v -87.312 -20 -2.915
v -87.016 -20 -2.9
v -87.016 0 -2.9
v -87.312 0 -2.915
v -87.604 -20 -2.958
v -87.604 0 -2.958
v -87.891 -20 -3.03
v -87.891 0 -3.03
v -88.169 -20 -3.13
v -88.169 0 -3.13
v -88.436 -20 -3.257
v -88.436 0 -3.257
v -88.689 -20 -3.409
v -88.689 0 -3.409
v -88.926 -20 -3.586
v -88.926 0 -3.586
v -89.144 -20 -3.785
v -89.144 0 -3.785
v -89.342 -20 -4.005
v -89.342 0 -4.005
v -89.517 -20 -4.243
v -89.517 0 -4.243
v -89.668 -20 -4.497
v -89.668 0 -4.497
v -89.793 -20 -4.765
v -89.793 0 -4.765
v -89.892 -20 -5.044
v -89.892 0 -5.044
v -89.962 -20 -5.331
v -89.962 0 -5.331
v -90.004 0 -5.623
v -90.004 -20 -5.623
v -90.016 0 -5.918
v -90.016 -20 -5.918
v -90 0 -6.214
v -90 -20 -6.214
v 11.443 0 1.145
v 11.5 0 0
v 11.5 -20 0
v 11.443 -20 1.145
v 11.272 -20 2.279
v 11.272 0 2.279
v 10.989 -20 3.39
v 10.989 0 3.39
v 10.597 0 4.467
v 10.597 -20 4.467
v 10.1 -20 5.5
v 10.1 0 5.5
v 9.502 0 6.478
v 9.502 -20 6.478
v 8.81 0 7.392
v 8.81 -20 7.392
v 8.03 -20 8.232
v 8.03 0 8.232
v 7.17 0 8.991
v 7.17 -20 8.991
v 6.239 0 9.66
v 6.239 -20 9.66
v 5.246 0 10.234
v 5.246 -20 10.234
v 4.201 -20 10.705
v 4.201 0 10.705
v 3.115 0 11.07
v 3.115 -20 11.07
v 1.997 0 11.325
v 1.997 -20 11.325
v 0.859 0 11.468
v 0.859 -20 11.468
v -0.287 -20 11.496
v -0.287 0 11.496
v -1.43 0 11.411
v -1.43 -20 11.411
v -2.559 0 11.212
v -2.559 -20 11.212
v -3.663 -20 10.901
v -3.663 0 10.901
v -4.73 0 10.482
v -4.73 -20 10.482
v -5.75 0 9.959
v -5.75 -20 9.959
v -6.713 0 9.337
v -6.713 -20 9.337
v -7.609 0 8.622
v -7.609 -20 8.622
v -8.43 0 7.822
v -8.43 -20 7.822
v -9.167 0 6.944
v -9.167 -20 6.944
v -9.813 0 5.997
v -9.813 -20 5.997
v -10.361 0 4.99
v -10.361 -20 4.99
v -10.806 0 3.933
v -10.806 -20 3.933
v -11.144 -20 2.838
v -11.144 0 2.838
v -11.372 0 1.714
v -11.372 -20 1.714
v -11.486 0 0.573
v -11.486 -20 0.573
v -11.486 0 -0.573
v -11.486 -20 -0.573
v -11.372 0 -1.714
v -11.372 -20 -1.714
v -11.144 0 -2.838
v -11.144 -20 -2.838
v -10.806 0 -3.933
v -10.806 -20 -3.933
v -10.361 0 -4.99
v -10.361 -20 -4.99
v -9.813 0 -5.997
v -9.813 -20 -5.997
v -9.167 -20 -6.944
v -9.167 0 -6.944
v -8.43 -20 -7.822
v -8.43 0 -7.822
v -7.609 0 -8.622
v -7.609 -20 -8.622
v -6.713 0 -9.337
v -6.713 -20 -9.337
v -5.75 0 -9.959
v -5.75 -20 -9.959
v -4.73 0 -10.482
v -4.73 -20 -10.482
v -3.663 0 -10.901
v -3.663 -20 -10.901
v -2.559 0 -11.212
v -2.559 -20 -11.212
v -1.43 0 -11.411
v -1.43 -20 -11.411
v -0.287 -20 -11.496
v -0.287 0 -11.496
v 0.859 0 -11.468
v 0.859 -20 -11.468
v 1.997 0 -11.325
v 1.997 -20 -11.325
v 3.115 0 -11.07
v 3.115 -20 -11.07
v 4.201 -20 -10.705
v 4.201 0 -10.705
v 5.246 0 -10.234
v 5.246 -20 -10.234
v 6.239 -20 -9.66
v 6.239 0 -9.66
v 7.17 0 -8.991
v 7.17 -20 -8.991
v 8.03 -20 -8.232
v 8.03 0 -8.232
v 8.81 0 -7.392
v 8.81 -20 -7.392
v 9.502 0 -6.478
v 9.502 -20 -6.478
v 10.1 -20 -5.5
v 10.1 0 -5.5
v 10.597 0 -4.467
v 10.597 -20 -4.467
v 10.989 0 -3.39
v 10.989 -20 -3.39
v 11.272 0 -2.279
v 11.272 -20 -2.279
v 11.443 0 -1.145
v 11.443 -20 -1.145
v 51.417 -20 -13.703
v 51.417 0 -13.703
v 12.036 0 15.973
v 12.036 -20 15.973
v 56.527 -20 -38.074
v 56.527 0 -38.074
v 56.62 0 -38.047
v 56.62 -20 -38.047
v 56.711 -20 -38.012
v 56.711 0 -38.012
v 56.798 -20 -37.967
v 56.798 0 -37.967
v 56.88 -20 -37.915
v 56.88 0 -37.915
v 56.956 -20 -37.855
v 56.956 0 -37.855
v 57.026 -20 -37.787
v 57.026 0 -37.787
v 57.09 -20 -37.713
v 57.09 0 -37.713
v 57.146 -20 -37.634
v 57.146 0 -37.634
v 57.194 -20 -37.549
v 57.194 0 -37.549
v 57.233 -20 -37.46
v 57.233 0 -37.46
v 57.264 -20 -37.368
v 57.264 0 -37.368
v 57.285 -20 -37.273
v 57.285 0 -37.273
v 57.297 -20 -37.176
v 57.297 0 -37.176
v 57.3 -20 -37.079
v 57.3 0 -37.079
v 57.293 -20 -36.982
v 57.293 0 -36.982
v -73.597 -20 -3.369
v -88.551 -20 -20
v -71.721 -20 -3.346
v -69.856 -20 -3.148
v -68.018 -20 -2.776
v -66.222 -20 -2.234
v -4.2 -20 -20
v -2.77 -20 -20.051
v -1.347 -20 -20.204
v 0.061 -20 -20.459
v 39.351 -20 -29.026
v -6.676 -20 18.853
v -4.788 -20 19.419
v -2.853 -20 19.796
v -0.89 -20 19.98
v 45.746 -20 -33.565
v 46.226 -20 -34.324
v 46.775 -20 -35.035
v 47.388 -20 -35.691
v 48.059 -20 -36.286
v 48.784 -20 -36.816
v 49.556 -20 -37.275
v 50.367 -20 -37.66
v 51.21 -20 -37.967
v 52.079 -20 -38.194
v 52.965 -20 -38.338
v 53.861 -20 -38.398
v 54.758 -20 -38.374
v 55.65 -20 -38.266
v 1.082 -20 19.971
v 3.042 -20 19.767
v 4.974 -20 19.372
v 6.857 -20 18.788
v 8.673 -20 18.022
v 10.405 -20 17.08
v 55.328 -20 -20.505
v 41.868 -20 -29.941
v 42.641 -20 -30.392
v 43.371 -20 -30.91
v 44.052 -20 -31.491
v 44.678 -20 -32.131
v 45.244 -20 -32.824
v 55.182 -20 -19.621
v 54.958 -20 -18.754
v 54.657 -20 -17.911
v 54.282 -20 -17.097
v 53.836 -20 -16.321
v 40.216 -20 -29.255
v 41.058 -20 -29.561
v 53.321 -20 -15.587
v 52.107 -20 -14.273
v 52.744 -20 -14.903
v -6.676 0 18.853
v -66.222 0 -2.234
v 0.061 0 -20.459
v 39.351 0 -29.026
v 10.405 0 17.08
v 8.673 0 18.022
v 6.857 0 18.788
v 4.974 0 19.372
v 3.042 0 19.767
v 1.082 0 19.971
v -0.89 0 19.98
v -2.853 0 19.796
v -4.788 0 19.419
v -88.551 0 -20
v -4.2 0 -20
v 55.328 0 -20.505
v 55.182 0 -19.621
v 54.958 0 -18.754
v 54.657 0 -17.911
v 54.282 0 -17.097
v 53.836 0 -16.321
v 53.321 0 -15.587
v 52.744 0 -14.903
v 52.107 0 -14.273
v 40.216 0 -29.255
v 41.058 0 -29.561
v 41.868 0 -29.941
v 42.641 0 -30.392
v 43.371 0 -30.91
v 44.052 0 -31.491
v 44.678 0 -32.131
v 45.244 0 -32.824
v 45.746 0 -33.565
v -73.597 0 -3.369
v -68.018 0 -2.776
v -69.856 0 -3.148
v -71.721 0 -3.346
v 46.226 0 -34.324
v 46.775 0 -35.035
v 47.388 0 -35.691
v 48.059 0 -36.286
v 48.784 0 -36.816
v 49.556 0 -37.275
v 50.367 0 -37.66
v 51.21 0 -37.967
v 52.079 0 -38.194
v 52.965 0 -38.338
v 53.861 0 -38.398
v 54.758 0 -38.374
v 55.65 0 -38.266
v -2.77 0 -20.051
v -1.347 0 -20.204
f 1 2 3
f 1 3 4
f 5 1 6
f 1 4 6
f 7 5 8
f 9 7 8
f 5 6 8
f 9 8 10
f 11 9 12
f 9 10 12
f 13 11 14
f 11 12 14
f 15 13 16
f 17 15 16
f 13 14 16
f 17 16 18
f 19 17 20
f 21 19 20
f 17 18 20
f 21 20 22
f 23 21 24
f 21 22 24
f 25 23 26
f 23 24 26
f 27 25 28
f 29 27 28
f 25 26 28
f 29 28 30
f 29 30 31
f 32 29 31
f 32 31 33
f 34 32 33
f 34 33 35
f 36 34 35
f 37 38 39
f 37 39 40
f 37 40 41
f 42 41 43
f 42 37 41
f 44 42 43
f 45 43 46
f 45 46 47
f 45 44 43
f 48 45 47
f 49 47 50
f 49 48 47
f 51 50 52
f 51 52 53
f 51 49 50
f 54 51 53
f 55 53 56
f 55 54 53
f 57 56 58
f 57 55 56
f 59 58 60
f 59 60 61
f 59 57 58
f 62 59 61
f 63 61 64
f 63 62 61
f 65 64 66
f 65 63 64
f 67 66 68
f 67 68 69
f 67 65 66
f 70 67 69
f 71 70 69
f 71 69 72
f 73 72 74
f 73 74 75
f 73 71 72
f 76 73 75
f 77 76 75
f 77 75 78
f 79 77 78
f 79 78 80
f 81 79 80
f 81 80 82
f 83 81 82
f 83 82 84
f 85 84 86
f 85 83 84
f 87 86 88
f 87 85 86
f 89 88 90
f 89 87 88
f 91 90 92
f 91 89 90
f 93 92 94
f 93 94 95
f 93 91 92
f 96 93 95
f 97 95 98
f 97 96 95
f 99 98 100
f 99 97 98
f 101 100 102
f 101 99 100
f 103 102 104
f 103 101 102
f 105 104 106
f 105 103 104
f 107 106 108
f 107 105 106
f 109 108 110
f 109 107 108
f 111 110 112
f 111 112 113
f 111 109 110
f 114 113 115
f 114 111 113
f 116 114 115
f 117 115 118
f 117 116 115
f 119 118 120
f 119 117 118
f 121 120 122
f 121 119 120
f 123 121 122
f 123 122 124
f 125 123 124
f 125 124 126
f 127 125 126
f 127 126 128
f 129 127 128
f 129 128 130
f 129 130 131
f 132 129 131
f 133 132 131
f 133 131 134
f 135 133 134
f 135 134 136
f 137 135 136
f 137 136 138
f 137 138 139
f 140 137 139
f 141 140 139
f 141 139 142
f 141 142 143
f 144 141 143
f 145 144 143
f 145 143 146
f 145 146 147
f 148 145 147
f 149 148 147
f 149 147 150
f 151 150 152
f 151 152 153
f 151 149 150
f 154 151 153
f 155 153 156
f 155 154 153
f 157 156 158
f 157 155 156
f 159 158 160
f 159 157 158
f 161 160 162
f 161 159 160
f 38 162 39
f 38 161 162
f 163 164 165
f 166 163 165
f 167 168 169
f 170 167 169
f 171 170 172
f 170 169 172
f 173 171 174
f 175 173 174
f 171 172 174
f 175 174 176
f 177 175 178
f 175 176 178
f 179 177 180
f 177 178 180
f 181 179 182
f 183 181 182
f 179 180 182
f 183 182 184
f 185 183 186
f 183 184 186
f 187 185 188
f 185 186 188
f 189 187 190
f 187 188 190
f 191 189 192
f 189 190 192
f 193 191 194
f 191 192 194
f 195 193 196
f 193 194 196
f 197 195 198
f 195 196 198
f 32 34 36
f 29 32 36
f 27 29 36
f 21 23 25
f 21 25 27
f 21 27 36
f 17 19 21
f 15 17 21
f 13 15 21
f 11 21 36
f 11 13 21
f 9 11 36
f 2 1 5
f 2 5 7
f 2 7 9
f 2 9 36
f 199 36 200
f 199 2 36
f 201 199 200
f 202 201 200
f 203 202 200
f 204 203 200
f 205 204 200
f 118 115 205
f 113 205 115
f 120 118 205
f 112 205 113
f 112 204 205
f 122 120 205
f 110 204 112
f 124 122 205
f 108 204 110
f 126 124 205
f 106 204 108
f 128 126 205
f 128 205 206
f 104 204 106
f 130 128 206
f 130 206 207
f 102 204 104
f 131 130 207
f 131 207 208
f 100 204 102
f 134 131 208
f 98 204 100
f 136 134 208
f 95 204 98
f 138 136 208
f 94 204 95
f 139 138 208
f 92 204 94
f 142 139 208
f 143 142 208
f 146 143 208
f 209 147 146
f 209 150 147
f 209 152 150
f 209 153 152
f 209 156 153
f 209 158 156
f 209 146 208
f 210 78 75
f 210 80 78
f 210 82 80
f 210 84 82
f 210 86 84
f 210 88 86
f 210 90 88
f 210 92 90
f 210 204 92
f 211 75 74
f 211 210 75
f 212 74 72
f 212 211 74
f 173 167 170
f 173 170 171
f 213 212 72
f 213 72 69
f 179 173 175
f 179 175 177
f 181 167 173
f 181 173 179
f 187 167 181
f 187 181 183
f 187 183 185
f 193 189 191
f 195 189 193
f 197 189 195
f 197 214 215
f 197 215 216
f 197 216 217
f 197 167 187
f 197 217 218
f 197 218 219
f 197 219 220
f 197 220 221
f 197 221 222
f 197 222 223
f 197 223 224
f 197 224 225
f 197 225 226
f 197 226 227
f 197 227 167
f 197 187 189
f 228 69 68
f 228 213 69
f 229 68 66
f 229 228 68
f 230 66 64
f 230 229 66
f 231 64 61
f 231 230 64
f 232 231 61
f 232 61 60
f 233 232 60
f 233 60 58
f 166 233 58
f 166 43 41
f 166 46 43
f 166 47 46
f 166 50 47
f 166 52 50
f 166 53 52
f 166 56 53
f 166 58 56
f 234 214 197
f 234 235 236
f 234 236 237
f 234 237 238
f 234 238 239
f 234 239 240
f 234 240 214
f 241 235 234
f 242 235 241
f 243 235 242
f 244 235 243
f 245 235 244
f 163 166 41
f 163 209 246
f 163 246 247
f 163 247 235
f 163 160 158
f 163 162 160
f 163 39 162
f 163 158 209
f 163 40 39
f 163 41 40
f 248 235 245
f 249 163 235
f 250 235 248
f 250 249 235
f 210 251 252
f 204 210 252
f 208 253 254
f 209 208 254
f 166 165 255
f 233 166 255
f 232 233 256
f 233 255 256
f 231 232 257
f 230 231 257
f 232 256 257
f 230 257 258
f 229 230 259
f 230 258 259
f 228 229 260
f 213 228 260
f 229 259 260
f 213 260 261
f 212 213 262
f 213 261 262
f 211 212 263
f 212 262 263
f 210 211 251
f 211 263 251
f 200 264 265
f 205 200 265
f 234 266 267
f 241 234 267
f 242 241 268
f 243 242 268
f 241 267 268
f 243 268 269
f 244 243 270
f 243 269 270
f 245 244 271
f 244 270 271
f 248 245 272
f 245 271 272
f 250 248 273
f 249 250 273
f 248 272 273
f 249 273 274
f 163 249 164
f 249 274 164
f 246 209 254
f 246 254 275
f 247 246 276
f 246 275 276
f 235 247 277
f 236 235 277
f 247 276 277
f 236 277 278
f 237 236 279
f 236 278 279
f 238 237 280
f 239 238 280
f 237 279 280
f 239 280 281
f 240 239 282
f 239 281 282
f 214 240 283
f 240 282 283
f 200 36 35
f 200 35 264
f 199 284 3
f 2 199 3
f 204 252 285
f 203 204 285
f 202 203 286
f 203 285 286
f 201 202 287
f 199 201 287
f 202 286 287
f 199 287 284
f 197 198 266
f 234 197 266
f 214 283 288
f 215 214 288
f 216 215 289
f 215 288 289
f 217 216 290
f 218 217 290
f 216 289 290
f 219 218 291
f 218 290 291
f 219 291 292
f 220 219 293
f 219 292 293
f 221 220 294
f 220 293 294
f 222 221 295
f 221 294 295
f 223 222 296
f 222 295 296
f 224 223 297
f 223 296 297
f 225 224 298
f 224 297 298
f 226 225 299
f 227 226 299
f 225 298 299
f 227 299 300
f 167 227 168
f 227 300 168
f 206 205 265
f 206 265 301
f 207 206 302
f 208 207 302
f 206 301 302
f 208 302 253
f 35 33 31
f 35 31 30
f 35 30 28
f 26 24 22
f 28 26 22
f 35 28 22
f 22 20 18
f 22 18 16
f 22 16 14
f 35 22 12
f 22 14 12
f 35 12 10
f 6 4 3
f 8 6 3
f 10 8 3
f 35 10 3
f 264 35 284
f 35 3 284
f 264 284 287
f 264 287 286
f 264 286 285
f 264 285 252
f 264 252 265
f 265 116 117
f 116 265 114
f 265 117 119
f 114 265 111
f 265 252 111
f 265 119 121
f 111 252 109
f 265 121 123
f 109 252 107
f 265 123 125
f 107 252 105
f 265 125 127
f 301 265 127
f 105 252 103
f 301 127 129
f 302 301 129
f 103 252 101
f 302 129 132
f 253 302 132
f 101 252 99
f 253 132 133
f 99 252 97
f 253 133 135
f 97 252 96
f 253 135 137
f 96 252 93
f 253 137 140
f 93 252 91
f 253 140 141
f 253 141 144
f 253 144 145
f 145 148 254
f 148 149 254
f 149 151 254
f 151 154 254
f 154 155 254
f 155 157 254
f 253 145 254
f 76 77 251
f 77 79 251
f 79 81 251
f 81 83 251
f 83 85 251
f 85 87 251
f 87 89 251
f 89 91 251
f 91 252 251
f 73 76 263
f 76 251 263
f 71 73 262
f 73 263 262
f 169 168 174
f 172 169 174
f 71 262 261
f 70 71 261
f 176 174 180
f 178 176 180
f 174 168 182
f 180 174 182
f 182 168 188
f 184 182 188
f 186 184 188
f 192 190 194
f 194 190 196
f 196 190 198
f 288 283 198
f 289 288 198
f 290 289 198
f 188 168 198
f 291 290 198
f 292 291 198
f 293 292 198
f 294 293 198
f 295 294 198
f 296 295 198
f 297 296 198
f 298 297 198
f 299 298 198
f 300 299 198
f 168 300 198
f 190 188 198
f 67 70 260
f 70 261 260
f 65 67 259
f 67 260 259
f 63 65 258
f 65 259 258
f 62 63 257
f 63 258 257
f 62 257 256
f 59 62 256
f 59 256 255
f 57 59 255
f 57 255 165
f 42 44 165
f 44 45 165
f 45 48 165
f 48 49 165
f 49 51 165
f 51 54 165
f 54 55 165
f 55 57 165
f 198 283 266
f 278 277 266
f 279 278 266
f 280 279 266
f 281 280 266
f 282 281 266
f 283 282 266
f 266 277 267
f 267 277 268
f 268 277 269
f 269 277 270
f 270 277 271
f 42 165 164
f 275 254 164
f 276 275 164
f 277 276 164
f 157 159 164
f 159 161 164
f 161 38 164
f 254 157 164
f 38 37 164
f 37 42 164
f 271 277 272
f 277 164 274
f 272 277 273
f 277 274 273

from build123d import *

# Parameters (mm, degrees)
F0_R     = 11.5
F1_DEPTH = 20


with BuildPart() as f1:
    # F0 (on Front) → F1 (new body)
    with BuildSketch(Plane.XZ):
        with BuildLine():
            ThreePointArc((12.0363, 15.97271), (3.042468, 19.76723), (-6.676137, 18.85283))
            Line((-6.676137, 18.85283), (-66.2225, -2.233643))
            ThreePointArc((-66.2225, -2.233643), (-69.85617, -3.148044), (-73.596627, -3.36863))
            Line((-73.596627, -3.36863), (-87.016434, -2.9))
            ThreePointArc((-87.016434, -2.9), (-89.245869, -3.892608), (-90, -6.213585))
            Line((-90, -6.213585), (-88.550989, -20))
            Line((-88.550989, -20), (-4.2, -20))
            ThreePointArc((-4.2, -20), (-2.057365, -20.115103), (0.060608, -20.459089))
            Line((0.060608, -20.459089), (39.351254, -29.025835))
            ThreePointArc((39.351254, -29.025835), (43.011955, -30.642935), (45.746406, -33.56501))
            ThreePointArc((45.746406, -33.56501), (50.366632, -37.660248), (56.526688, -38.073967))
            ThreePointArc((56.526688, -38.073967), (57.118662, -37.674275), (57.292966, -36.981596))
            Line((57.292966, -36.981596), (55.328237, -20.504889))
            ThreePointArc((55.328237, -20.504889), (54.06755, -16.704051), (51.416732, -13.702574))
            Line((51.416732, -13.702574), (12.0363, 15.97271))
        make_face()
        Circle(F0_R, mode=Mode.SUBTRACT)
    extrude(amount=F1_DEPTH)


solid = f1.part
